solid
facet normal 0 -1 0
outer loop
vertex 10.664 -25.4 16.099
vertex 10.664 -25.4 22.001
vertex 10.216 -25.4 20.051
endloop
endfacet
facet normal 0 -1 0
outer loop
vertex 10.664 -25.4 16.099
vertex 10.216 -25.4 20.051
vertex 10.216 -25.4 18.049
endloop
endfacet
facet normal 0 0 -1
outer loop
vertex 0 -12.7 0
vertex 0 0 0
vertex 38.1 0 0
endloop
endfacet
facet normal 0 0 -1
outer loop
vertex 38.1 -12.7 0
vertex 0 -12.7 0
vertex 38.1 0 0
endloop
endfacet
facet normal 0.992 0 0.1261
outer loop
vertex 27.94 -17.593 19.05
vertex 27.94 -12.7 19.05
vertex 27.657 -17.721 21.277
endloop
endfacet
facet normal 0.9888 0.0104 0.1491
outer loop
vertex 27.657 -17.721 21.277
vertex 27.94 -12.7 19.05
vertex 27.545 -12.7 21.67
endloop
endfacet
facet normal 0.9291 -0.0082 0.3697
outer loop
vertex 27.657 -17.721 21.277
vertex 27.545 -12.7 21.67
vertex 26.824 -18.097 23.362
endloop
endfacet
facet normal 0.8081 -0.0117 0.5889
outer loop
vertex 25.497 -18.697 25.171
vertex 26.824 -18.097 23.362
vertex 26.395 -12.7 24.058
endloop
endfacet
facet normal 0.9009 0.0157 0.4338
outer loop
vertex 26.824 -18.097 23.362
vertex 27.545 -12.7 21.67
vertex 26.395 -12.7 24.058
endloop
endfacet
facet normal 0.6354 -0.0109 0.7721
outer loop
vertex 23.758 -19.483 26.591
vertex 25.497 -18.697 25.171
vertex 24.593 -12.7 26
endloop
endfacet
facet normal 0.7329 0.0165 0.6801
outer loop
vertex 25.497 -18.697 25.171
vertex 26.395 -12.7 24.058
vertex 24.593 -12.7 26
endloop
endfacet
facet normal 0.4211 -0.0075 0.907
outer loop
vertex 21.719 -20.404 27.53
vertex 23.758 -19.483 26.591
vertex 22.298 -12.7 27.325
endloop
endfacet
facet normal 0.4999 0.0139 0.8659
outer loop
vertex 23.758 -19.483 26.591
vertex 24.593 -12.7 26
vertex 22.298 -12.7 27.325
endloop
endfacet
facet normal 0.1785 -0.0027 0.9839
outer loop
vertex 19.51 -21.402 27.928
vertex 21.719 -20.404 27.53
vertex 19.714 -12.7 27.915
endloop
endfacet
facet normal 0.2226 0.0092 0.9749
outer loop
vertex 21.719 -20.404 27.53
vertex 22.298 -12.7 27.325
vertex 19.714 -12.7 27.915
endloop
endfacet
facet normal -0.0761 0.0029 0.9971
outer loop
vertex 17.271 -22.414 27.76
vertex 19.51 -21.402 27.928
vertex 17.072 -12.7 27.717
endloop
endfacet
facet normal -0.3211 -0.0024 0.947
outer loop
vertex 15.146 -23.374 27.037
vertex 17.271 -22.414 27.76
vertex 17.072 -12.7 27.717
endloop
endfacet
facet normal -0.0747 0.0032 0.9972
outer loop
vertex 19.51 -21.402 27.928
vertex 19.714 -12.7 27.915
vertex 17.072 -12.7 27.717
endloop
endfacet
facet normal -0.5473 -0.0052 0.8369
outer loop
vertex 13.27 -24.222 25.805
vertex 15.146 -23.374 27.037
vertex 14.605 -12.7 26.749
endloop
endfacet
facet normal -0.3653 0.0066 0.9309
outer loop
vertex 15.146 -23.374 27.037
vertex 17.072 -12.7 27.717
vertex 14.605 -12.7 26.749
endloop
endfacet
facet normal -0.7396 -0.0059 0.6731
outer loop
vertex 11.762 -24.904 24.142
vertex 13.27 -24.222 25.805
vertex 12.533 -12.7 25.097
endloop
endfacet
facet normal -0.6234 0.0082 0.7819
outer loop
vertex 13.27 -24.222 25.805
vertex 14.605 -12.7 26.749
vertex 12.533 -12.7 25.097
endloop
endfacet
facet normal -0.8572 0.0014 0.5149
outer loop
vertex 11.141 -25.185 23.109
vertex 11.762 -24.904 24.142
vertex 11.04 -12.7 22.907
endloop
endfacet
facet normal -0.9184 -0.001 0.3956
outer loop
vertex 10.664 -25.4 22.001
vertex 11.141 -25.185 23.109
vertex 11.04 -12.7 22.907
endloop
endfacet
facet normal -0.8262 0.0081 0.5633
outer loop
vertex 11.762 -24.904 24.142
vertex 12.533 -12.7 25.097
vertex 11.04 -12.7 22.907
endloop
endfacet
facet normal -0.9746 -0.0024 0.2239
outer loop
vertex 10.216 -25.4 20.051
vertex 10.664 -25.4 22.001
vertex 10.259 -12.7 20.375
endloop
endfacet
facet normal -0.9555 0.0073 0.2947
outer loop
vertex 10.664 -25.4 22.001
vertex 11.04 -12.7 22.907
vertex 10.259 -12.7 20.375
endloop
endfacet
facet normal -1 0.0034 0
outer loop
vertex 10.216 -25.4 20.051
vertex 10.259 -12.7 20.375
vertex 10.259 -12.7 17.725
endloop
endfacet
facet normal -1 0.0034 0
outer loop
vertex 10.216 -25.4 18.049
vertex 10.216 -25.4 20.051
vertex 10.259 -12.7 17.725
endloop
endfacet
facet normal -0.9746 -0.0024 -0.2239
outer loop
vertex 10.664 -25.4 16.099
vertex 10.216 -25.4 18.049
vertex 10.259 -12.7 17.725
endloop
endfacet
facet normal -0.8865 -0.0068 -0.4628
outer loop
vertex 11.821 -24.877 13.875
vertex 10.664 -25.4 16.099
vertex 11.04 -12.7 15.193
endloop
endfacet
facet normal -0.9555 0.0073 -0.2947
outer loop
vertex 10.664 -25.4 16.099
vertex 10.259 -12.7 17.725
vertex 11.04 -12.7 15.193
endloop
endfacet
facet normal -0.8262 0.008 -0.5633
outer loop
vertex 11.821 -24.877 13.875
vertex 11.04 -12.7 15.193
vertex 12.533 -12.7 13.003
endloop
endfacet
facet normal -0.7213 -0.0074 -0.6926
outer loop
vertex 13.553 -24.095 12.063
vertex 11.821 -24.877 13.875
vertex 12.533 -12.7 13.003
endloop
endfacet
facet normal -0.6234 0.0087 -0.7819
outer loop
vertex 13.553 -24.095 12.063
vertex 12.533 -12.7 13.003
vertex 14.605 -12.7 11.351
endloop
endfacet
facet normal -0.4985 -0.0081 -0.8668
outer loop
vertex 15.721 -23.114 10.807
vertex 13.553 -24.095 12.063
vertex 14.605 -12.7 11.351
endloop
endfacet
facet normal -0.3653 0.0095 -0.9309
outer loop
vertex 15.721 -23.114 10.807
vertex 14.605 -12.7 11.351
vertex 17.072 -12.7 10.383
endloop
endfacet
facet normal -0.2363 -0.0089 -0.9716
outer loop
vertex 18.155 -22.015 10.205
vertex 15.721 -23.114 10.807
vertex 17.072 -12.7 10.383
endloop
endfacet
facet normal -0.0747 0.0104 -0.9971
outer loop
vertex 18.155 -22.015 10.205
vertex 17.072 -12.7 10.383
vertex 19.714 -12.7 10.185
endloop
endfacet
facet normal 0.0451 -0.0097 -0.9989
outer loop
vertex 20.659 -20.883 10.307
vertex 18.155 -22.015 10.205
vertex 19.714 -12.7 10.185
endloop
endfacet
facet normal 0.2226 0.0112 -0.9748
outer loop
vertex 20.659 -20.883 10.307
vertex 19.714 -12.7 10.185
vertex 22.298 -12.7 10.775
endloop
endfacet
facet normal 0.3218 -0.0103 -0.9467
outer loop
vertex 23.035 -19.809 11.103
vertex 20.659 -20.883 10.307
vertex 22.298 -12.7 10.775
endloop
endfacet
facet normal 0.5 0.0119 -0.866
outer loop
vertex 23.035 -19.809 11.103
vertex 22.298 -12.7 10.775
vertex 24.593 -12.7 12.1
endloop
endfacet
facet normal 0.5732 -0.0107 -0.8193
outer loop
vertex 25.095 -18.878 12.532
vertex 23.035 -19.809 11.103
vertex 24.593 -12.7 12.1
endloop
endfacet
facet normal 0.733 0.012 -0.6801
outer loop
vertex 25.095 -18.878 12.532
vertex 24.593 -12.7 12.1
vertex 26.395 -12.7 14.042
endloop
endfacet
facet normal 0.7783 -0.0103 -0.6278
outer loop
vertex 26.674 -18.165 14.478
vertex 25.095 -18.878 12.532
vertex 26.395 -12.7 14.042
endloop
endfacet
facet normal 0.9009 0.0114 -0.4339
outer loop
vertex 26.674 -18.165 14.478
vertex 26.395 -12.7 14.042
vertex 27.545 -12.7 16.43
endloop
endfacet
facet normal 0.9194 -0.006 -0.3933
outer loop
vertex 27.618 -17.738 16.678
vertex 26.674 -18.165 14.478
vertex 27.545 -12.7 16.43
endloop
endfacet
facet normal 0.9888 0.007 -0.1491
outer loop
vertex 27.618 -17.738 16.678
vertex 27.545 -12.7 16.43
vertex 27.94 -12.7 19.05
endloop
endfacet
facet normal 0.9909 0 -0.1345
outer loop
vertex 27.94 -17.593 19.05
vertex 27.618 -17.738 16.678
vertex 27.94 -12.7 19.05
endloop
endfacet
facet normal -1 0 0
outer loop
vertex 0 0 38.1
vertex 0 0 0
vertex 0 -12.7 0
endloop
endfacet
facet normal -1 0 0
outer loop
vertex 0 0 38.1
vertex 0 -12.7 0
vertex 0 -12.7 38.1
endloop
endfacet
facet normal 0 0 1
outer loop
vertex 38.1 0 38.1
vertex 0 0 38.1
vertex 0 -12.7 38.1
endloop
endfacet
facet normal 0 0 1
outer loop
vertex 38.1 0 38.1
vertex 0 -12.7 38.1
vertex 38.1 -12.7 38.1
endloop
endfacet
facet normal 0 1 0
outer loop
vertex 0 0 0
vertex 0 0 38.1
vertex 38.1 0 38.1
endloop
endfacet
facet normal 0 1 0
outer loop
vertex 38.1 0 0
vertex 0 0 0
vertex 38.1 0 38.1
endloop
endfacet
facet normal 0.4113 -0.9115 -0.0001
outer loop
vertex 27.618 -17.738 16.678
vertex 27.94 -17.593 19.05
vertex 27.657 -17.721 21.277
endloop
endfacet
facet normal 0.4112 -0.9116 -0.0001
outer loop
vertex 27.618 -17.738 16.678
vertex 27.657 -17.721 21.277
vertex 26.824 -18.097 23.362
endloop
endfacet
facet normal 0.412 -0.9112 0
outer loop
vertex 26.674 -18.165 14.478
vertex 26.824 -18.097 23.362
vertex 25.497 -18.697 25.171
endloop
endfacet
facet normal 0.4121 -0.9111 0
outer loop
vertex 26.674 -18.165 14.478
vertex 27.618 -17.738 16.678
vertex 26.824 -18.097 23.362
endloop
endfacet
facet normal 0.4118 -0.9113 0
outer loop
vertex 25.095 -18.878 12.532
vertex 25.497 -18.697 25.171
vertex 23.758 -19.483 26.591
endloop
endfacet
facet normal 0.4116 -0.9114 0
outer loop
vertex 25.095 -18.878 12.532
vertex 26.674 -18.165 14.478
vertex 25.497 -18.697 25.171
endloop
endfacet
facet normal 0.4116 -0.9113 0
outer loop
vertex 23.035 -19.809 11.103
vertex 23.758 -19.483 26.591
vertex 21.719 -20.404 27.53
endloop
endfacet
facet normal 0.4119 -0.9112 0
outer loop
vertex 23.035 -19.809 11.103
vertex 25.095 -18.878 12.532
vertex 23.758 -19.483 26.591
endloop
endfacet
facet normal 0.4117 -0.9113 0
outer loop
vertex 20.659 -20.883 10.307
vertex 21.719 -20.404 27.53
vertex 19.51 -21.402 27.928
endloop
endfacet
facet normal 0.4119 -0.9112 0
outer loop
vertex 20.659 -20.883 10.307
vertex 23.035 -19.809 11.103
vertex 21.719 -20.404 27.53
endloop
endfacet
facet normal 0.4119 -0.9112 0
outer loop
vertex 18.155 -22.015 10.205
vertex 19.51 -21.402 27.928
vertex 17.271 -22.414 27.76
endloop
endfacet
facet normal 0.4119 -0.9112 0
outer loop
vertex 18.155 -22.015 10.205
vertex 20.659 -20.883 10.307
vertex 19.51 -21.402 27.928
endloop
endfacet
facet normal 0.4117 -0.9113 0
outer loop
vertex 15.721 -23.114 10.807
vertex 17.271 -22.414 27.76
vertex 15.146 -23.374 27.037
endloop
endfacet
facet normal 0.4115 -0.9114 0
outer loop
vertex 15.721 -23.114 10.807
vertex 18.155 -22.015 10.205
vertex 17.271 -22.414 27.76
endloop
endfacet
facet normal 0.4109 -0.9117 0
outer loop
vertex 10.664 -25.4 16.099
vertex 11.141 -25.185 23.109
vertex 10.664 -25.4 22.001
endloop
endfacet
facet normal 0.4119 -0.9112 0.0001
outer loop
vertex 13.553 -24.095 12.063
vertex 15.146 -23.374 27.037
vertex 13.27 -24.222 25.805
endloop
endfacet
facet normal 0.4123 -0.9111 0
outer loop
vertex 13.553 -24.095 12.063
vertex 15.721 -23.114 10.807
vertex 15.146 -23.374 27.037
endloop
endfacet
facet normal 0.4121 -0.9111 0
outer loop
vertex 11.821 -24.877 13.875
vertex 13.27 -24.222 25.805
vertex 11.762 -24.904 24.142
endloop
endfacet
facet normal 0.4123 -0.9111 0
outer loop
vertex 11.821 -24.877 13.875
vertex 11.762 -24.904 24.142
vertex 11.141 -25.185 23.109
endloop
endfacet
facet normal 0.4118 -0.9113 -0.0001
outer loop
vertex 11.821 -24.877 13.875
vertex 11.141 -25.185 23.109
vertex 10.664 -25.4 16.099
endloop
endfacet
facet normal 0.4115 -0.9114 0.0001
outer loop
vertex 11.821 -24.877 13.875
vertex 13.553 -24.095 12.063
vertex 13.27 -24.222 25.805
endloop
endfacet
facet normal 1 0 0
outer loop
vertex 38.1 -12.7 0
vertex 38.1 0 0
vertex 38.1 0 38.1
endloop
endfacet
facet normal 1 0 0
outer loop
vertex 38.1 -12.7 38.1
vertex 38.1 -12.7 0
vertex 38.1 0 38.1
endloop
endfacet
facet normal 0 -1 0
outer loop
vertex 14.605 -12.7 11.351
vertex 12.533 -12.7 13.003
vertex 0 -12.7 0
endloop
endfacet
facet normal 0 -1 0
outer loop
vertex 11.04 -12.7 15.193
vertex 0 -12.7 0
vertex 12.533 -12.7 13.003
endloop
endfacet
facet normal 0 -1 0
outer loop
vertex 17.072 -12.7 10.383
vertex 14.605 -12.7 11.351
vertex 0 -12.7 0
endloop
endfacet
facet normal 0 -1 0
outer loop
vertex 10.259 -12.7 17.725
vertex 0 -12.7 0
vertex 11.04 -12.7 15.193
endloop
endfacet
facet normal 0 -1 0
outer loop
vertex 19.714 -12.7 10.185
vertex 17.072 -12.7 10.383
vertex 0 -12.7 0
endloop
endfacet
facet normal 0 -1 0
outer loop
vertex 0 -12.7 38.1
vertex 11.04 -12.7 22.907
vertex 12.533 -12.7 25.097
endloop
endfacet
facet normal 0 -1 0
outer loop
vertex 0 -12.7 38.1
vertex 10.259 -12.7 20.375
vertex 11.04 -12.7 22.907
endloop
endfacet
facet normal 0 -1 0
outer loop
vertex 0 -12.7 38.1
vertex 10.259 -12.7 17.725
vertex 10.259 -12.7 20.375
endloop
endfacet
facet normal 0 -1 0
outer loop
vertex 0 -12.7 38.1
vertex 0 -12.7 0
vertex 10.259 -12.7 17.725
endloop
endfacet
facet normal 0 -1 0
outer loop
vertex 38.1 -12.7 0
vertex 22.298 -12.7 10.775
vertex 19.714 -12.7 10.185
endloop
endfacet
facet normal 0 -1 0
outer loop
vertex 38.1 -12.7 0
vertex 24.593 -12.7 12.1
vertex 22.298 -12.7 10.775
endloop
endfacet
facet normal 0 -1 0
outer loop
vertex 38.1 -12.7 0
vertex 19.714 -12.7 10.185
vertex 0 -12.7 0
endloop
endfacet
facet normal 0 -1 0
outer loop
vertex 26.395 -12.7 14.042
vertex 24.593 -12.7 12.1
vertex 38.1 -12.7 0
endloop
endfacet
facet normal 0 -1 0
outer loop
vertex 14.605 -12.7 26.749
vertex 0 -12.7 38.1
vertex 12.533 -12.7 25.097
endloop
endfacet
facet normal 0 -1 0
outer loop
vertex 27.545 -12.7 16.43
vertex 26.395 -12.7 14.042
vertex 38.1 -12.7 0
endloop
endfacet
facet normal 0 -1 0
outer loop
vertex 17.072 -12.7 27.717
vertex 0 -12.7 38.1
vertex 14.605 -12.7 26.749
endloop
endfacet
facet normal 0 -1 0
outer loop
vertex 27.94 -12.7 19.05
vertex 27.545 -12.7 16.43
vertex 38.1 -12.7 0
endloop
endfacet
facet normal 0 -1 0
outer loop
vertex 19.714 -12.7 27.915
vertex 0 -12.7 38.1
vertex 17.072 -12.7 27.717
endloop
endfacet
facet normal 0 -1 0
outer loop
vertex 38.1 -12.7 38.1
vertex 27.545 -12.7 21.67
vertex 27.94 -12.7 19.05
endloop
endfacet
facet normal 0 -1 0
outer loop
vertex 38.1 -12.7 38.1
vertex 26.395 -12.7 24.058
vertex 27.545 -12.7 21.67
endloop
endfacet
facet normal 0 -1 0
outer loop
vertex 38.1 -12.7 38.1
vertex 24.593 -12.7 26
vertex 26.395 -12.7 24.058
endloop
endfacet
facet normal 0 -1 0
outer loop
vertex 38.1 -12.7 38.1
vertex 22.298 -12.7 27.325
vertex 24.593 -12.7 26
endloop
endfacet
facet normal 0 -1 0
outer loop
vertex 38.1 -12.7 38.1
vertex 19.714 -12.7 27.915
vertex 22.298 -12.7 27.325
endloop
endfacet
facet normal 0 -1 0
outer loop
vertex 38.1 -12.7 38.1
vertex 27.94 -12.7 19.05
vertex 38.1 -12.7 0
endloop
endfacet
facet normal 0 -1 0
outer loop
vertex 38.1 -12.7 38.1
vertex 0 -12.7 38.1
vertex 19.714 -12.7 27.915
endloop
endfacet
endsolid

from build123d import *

# Parameters (mm, degrees)
F0_W     = 38.1
F0_H     = 38.1
F1_DEPTH = 12.7
F2_R     = 8.89
F3_DEPTH = 12.7
F5_DEPTH = 254


with BuildPart() as f1:
    # F0 (on Front) → F1 (new body)
    with BuildSketch(Plane.XZ):
        with Locations((19.05, 19.05)):
            Rectangle(F0_W, F0_H)
    extrude(amount=F1_DEPTH)

    # F2 (on face) → F3 (join)
    with BuildSketch(Plane.XZ.offset(12.7)):
        with Locations((19.05, 19.05)):
            Circle(F2_R)
    extrude(amount=F3_DEPTH)

    # F4 (on Top) → F5 (cut)
    with BuildSketch(Plane.XY):
        Polygon((29.379437, -16.942142), (9.009695, -26.147699), (29.379437, -26.147699), align=None)
    extrude(amount=F5_DEPTH, mode=Mode.SUBTRACT)


solid = f1.part
